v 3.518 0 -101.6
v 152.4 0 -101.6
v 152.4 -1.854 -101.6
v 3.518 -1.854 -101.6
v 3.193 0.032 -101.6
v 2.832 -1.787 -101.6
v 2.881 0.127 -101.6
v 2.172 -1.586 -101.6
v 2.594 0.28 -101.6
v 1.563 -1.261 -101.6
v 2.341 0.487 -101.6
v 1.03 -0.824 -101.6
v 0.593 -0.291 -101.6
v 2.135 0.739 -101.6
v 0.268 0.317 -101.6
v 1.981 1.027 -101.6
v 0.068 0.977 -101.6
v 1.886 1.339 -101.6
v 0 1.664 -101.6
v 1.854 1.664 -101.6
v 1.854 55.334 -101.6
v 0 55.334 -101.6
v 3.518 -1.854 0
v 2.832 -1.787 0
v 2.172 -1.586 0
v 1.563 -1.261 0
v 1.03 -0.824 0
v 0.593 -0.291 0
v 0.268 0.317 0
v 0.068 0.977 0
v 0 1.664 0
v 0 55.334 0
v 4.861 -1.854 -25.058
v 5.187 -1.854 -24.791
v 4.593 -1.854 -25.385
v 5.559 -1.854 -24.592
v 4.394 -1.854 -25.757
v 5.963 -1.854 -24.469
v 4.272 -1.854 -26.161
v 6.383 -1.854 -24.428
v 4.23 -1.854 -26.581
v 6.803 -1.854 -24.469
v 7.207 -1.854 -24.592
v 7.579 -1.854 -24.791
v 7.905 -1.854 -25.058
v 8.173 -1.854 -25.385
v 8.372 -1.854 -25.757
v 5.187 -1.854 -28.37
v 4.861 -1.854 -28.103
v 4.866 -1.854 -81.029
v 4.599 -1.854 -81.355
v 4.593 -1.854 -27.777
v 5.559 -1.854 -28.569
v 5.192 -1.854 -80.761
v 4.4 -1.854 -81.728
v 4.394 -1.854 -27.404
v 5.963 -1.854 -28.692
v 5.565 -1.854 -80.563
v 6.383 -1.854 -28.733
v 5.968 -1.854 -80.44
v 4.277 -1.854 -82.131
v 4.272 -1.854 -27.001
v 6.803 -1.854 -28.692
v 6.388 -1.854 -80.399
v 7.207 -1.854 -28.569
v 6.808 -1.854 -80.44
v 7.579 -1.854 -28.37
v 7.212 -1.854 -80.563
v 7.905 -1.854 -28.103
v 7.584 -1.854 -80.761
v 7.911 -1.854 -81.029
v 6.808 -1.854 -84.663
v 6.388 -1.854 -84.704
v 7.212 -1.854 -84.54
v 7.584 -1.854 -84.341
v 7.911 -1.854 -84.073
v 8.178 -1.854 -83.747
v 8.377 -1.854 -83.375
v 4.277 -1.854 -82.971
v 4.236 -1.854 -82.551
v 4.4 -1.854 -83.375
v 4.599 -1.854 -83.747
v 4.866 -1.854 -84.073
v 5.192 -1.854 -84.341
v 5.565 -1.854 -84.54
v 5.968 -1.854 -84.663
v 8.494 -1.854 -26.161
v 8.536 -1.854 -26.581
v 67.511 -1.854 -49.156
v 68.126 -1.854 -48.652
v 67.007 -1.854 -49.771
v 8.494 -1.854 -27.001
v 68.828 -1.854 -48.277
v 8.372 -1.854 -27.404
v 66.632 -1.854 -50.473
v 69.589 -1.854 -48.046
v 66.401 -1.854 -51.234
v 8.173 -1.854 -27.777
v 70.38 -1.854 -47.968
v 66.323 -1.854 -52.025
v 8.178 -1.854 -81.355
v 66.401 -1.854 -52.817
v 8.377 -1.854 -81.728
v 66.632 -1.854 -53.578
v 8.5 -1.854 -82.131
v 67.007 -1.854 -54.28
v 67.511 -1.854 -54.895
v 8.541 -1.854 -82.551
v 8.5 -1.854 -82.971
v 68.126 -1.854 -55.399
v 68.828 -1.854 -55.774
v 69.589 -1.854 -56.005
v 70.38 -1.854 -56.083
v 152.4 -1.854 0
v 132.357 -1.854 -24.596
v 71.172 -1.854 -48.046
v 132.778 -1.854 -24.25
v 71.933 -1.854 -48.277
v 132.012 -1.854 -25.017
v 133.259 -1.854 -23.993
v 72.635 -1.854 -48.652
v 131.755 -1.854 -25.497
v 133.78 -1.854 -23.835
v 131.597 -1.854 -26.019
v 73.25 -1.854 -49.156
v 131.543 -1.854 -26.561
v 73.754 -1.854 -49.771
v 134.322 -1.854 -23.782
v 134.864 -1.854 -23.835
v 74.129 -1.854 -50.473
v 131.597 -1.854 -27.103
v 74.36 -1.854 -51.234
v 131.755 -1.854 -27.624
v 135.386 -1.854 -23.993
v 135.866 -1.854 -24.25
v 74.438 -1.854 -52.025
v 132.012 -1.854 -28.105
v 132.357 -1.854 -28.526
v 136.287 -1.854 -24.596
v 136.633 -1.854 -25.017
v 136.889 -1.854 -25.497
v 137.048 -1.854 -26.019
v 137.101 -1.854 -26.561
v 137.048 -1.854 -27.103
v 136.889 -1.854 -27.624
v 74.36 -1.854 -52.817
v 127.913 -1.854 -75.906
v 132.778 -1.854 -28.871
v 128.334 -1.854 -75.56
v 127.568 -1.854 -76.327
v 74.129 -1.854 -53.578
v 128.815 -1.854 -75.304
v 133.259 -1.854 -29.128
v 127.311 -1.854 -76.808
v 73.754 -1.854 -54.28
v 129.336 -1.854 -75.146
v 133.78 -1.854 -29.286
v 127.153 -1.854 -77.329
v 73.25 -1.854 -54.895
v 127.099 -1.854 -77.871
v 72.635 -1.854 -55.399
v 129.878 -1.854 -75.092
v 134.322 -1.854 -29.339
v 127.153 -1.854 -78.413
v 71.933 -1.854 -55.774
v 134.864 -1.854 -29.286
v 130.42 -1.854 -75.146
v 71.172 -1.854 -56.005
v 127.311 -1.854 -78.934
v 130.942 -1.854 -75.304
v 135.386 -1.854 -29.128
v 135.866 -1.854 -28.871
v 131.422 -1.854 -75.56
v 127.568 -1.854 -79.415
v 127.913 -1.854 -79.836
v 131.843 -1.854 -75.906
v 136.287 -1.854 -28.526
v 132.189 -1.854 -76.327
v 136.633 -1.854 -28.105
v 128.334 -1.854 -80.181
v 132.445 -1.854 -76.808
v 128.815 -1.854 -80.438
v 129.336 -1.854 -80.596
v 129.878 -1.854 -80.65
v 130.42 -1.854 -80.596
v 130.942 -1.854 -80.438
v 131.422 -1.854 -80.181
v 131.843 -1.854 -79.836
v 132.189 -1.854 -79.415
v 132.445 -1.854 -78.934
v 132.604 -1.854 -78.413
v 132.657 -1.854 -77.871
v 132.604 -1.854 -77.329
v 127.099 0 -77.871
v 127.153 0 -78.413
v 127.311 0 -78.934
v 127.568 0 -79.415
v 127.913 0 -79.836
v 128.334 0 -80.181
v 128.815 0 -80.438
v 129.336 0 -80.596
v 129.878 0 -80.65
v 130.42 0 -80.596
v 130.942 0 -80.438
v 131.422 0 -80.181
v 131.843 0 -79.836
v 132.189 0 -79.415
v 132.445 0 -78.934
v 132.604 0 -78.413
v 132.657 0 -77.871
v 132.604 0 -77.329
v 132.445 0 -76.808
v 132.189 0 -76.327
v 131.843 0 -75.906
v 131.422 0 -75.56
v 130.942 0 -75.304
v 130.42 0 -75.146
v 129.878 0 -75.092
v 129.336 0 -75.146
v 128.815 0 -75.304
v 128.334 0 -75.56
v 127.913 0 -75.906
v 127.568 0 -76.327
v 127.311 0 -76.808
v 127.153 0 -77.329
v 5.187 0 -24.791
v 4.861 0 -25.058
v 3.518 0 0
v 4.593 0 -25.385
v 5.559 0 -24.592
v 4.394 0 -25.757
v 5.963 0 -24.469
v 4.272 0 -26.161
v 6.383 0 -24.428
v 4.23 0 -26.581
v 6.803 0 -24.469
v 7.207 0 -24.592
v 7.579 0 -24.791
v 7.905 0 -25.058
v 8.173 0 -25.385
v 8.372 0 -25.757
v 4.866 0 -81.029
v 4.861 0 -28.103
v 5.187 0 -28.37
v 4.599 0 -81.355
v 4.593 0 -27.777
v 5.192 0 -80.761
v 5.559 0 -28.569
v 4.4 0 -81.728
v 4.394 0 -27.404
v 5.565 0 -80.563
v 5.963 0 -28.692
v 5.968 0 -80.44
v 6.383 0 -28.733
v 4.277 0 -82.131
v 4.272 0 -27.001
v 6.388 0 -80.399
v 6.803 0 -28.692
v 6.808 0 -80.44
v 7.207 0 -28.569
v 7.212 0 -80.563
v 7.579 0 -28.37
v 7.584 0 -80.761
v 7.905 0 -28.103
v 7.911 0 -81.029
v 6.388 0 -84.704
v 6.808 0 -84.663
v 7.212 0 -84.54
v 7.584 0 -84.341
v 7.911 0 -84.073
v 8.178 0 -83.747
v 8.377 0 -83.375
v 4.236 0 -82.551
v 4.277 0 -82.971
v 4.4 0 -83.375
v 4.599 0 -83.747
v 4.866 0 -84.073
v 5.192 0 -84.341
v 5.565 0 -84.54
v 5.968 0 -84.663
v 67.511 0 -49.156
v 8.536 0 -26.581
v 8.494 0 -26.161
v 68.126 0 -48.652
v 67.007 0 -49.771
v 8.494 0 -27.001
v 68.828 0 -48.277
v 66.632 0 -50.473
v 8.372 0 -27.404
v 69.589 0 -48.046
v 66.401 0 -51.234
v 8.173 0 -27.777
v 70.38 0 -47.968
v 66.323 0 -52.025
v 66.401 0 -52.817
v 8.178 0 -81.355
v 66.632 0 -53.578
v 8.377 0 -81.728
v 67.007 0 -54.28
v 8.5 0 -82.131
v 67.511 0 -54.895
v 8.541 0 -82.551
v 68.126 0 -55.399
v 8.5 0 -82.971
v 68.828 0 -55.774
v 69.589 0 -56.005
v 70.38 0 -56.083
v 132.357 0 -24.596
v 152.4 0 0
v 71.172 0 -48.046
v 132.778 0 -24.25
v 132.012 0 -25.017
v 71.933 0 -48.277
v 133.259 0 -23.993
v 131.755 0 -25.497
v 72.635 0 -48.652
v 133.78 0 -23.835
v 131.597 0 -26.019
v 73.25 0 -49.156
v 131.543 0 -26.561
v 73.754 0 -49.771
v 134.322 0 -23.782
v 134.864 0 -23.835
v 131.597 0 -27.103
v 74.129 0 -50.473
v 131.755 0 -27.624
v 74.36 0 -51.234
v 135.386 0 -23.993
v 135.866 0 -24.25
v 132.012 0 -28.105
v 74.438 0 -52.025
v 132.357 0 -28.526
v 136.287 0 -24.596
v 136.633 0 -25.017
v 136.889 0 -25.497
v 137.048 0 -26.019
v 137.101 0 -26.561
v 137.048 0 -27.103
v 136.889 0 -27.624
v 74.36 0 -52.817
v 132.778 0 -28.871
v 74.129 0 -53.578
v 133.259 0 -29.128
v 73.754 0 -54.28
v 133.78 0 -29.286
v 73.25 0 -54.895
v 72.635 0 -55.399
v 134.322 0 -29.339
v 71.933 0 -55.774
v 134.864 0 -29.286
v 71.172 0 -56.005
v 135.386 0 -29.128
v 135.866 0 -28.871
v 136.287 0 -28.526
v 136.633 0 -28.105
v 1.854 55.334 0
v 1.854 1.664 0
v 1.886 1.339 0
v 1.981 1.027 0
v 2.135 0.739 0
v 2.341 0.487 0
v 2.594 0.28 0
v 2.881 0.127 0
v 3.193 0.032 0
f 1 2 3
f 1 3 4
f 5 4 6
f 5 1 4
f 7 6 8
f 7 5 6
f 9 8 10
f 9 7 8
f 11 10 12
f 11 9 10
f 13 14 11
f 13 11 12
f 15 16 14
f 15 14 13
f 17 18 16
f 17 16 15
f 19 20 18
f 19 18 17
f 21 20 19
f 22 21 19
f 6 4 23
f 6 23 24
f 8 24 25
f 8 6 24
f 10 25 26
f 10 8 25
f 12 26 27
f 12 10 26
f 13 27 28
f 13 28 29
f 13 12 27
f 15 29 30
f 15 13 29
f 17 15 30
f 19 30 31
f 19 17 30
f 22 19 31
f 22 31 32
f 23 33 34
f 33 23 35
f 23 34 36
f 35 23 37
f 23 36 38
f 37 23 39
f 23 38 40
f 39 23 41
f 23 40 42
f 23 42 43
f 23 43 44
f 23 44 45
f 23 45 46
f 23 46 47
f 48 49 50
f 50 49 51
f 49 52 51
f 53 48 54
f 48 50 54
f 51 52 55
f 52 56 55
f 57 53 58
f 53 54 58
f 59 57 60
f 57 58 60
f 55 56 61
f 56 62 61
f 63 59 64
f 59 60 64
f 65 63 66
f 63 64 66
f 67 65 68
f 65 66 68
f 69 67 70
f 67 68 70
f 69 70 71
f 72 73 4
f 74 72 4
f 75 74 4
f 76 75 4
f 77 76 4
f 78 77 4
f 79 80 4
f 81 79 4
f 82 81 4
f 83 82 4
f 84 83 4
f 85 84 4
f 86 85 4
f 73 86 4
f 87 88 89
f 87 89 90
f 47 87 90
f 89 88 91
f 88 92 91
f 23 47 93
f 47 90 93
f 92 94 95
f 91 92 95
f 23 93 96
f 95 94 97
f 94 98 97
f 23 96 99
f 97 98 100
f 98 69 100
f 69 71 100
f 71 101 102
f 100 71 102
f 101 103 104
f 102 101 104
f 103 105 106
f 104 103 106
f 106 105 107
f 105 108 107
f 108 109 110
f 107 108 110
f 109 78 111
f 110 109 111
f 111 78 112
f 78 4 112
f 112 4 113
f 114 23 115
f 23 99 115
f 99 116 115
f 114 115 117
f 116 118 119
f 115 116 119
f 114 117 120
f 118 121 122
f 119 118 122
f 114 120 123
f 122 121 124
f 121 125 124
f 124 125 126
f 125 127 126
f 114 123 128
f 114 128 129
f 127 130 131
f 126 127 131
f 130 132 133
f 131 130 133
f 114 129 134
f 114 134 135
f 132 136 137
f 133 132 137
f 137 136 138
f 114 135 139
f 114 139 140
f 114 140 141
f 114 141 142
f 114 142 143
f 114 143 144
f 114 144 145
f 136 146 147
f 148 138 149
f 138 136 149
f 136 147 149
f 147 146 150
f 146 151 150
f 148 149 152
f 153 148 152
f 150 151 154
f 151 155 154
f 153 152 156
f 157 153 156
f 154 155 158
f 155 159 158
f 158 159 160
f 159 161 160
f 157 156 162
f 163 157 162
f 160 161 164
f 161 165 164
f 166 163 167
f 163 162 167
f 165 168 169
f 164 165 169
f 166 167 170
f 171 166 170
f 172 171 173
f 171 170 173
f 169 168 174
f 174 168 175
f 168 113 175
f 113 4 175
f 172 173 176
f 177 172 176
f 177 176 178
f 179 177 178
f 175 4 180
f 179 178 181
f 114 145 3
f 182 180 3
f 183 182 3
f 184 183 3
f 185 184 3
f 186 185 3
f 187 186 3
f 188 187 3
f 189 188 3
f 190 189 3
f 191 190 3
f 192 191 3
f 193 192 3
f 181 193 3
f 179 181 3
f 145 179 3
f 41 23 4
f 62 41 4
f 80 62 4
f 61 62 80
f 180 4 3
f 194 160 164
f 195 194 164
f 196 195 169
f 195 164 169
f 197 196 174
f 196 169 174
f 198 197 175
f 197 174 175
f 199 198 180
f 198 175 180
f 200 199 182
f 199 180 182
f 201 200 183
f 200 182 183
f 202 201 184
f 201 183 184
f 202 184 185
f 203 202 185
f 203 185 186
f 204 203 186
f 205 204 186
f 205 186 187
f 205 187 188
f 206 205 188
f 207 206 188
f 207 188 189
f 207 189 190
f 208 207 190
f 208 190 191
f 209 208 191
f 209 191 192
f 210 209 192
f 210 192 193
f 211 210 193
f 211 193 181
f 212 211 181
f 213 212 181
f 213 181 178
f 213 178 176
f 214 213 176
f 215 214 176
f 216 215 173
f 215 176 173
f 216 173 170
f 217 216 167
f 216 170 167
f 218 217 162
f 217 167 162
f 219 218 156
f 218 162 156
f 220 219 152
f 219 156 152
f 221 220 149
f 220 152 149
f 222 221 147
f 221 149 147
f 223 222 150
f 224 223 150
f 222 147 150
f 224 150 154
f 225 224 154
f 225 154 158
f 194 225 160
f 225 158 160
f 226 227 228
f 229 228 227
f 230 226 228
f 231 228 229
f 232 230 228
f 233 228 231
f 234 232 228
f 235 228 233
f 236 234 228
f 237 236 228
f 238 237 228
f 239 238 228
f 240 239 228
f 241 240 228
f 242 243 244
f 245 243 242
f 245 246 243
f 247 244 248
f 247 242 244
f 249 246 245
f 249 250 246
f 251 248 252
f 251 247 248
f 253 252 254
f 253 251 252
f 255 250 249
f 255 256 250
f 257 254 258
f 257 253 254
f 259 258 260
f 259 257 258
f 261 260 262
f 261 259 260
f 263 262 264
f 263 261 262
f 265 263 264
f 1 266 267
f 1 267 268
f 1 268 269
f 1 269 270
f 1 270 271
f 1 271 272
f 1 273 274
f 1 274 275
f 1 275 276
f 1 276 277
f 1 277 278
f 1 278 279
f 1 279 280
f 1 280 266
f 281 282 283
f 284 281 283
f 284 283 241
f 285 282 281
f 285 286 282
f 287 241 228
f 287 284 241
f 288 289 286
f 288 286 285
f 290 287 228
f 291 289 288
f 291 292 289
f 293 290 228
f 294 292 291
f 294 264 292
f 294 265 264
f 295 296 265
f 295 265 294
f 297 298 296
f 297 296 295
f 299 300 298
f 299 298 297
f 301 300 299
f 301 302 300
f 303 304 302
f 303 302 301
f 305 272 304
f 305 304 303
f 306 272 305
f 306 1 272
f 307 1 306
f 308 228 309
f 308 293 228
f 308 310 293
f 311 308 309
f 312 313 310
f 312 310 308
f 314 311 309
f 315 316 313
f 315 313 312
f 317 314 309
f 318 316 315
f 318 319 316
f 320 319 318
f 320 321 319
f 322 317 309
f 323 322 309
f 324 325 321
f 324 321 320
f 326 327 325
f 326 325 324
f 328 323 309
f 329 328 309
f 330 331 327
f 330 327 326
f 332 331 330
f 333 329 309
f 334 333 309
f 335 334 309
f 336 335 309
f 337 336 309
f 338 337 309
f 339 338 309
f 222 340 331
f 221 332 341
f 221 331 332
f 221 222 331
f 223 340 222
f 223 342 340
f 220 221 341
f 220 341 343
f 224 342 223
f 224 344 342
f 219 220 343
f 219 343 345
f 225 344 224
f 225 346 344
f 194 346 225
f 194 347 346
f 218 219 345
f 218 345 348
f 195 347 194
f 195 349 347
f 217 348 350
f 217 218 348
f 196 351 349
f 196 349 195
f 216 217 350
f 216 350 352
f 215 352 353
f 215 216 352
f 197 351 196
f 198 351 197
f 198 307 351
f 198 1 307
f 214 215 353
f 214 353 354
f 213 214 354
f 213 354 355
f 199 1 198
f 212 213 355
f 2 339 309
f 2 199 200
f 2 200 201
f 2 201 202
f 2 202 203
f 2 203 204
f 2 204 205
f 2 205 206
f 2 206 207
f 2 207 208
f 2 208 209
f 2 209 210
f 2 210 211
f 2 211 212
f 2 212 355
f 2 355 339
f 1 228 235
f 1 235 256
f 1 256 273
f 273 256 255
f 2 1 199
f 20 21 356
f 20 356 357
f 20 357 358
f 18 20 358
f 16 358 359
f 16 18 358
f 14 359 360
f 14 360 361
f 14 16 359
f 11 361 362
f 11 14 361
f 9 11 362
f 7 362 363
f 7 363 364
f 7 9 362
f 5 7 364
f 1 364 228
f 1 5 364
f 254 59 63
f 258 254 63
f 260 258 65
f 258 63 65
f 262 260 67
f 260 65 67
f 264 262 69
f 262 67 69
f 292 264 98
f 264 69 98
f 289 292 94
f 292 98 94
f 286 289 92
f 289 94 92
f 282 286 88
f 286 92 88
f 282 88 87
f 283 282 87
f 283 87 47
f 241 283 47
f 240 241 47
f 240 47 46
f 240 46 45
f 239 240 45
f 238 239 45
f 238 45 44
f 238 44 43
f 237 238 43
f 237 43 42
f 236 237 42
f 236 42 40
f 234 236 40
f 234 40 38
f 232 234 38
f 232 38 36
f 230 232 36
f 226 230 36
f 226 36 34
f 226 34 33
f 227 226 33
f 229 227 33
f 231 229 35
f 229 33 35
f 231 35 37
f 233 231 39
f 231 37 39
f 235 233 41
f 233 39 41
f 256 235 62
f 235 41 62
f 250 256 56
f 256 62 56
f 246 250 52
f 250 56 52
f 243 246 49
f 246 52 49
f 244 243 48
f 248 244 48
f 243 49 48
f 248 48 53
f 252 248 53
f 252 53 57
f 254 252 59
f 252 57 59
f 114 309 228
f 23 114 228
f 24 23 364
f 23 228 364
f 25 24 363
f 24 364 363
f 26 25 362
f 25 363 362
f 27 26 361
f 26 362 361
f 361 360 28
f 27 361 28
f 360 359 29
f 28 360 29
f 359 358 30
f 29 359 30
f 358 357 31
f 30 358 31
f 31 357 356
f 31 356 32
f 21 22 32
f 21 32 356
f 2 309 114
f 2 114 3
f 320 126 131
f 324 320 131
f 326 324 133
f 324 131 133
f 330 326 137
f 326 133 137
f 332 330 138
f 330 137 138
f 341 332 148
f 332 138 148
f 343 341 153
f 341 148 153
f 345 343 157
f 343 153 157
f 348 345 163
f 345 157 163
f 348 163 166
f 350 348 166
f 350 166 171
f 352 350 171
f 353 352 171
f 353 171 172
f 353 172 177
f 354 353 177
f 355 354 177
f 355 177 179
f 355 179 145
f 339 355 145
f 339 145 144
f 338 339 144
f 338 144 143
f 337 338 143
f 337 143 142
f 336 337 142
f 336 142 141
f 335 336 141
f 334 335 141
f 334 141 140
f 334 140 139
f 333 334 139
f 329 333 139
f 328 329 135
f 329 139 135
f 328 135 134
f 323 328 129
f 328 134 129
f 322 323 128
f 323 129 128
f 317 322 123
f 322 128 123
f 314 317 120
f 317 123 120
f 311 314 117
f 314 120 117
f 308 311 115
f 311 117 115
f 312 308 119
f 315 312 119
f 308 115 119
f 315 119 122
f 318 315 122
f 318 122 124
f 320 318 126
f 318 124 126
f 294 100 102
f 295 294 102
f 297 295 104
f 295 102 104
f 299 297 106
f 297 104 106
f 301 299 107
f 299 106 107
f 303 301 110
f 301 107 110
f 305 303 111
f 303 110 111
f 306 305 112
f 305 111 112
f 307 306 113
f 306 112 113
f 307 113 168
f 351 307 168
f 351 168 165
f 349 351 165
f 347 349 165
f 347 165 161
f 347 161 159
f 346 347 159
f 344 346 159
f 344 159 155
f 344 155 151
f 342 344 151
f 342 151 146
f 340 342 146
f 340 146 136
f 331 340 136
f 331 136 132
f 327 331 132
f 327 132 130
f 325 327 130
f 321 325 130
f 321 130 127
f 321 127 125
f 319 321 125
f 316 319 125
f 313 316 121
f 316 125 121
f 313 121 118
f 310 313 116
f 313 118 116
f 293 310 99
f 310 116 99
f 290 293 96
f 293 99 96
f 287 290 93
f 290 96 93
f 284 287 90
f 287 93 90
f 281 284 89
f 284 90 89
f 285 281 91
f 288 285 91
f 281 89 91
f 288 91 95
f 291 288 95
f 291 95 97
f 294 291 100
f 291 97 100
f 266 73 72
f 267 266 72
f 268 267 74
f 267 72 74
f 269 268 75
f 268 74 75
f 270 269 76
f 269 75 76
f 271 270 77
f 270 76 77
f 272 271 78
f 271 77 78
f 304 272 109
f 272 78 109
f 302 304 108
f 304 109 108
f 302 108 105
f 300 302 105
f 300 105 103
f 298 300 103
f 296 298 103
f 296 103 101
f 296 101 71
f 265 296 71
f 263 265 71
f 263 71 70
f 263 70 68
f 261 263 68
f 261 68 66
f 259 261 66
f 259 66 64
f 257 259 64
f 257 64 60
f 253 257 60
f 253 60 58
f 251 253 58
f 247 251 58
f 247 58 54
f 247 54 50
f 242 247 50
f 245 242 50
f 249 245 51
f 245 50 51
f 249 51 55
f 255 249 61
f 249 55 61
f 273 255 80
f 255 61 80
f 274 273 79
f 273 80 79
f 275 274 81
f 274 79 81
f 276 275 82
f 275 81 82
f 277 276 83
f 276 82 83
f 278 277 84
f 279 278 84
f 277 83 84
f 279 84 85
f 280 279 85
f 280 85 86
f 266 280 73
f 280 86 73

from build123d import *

# Parameters (mm, degrees)
SKETCH1_W                    = 152.4
SKETCH1_H                    = 101.6
BASE_FLANGE1_DEPTH           = 1.8542
EDGE_FLANGE1_STRIP_W         = 10.7442
EDGE_FLANGE1_STRIP_H         = 1.8542
EDGE_FLANGE1_STRIP_CUT_DEPTH = 101.6
EDGE_FLANGE1_DEPTH           = 101.6
F_1_4_20_TAPPED_HOLE1_D      = 5.55752
F_3_8_16_TAPPED_HOLE1_D      = 8.1153
F_10_32_TAPPED_HOLE1_D       = 4.3053


# Sheet-metal steps are written as plain solids
with BuildPart() as part:
    # Sketch1 → Base-Flange1 (new body)
    with BuildSketch(Plane(origin=(0, 0, 0), x_dir=(1, 0, 0), z_dir=(0, 1, 0))):
        with Locations((76.2, 50.8)):
            Rectangle(SKETCH1_W, SKETCH1_H)
    extrude(amount=-BASE_FLANGE1_DEPTH)

    # Edge-Flange1 strip (across the edge) → Edge-Flange1 strip cut (cut)
    with BuildSketch(Plane.XY.offset(-101.6)):
        with Locations((-1.8542, -0.9271)):
            Rectangle(EDGE_FLANGE1_STRIP_W, EDGE_FLANGE1_STRIP_H)
    extrude(amount=EDGE_FLANGE1_STRIP_CUT_DEPTH, mode=Mode.SUBTRACT)

    # Edge-Flange1 section (across the edge) → Edge-Flange1 (add)
    with BuildSketch(Plane.XY.offset(-101.6)):
        with BuildLine():
            Line((0, 1.6637), (0, 55.3339))
            Line((0, 55.3339), (1.8542, 55.3339))
            Line((1.8542, 55.3339), (1.8542, 1.6637))
            ThreePointArc((1.8542, 1.6637), (2.341486448, 0.487286448), (3.5179, 0))
            Line((3.5179, 0), (3.5179, -1.8542))
            ThreePointArc((3.5179, -1.8542), (1.030369054, -0.823830946), (0, 1.6637))
        make_face()
    extrude(amount=EDGE_FLANGE1_DEPTH)

    # 1/4-20 Tapped Hole1 (through all)
    with Locations(Plane(origin=(0, 0, 0), x_dir=(1, 0, 0), z_dir=(0, 1, 0))):
        with Locations((129.87815907, 77.870917938), (134.322155935, 26.560738372)):
            Hole(F_1_4_20_TAPPED_HOLE1_D / 2)

    # 3/8-16 Tapped Hole1 (through all)
    with Locations(Plane(origin=(0, 0, 0), x_dir=(1, 0, 0), z_dir=(0, 1, 0))):
        with Locations((70.38044711, 52.025325842)):
            Hole(F_3_8_16_TAPPED_HOLE1_D / 2)

    # #10-32 Tapped Hole1 (through all)
    with Locations(Plane(origin=(6.383092755, 0, -26.580603581), x_dir=(0, 0, 1), z_dir=(0, 1, 0))):
        with Locations((0, 0), (-55.970741812, 0.005307766)):
            Hole(F_10_32_TAPPED_HOLE1_D / 2)


solid = part.part
